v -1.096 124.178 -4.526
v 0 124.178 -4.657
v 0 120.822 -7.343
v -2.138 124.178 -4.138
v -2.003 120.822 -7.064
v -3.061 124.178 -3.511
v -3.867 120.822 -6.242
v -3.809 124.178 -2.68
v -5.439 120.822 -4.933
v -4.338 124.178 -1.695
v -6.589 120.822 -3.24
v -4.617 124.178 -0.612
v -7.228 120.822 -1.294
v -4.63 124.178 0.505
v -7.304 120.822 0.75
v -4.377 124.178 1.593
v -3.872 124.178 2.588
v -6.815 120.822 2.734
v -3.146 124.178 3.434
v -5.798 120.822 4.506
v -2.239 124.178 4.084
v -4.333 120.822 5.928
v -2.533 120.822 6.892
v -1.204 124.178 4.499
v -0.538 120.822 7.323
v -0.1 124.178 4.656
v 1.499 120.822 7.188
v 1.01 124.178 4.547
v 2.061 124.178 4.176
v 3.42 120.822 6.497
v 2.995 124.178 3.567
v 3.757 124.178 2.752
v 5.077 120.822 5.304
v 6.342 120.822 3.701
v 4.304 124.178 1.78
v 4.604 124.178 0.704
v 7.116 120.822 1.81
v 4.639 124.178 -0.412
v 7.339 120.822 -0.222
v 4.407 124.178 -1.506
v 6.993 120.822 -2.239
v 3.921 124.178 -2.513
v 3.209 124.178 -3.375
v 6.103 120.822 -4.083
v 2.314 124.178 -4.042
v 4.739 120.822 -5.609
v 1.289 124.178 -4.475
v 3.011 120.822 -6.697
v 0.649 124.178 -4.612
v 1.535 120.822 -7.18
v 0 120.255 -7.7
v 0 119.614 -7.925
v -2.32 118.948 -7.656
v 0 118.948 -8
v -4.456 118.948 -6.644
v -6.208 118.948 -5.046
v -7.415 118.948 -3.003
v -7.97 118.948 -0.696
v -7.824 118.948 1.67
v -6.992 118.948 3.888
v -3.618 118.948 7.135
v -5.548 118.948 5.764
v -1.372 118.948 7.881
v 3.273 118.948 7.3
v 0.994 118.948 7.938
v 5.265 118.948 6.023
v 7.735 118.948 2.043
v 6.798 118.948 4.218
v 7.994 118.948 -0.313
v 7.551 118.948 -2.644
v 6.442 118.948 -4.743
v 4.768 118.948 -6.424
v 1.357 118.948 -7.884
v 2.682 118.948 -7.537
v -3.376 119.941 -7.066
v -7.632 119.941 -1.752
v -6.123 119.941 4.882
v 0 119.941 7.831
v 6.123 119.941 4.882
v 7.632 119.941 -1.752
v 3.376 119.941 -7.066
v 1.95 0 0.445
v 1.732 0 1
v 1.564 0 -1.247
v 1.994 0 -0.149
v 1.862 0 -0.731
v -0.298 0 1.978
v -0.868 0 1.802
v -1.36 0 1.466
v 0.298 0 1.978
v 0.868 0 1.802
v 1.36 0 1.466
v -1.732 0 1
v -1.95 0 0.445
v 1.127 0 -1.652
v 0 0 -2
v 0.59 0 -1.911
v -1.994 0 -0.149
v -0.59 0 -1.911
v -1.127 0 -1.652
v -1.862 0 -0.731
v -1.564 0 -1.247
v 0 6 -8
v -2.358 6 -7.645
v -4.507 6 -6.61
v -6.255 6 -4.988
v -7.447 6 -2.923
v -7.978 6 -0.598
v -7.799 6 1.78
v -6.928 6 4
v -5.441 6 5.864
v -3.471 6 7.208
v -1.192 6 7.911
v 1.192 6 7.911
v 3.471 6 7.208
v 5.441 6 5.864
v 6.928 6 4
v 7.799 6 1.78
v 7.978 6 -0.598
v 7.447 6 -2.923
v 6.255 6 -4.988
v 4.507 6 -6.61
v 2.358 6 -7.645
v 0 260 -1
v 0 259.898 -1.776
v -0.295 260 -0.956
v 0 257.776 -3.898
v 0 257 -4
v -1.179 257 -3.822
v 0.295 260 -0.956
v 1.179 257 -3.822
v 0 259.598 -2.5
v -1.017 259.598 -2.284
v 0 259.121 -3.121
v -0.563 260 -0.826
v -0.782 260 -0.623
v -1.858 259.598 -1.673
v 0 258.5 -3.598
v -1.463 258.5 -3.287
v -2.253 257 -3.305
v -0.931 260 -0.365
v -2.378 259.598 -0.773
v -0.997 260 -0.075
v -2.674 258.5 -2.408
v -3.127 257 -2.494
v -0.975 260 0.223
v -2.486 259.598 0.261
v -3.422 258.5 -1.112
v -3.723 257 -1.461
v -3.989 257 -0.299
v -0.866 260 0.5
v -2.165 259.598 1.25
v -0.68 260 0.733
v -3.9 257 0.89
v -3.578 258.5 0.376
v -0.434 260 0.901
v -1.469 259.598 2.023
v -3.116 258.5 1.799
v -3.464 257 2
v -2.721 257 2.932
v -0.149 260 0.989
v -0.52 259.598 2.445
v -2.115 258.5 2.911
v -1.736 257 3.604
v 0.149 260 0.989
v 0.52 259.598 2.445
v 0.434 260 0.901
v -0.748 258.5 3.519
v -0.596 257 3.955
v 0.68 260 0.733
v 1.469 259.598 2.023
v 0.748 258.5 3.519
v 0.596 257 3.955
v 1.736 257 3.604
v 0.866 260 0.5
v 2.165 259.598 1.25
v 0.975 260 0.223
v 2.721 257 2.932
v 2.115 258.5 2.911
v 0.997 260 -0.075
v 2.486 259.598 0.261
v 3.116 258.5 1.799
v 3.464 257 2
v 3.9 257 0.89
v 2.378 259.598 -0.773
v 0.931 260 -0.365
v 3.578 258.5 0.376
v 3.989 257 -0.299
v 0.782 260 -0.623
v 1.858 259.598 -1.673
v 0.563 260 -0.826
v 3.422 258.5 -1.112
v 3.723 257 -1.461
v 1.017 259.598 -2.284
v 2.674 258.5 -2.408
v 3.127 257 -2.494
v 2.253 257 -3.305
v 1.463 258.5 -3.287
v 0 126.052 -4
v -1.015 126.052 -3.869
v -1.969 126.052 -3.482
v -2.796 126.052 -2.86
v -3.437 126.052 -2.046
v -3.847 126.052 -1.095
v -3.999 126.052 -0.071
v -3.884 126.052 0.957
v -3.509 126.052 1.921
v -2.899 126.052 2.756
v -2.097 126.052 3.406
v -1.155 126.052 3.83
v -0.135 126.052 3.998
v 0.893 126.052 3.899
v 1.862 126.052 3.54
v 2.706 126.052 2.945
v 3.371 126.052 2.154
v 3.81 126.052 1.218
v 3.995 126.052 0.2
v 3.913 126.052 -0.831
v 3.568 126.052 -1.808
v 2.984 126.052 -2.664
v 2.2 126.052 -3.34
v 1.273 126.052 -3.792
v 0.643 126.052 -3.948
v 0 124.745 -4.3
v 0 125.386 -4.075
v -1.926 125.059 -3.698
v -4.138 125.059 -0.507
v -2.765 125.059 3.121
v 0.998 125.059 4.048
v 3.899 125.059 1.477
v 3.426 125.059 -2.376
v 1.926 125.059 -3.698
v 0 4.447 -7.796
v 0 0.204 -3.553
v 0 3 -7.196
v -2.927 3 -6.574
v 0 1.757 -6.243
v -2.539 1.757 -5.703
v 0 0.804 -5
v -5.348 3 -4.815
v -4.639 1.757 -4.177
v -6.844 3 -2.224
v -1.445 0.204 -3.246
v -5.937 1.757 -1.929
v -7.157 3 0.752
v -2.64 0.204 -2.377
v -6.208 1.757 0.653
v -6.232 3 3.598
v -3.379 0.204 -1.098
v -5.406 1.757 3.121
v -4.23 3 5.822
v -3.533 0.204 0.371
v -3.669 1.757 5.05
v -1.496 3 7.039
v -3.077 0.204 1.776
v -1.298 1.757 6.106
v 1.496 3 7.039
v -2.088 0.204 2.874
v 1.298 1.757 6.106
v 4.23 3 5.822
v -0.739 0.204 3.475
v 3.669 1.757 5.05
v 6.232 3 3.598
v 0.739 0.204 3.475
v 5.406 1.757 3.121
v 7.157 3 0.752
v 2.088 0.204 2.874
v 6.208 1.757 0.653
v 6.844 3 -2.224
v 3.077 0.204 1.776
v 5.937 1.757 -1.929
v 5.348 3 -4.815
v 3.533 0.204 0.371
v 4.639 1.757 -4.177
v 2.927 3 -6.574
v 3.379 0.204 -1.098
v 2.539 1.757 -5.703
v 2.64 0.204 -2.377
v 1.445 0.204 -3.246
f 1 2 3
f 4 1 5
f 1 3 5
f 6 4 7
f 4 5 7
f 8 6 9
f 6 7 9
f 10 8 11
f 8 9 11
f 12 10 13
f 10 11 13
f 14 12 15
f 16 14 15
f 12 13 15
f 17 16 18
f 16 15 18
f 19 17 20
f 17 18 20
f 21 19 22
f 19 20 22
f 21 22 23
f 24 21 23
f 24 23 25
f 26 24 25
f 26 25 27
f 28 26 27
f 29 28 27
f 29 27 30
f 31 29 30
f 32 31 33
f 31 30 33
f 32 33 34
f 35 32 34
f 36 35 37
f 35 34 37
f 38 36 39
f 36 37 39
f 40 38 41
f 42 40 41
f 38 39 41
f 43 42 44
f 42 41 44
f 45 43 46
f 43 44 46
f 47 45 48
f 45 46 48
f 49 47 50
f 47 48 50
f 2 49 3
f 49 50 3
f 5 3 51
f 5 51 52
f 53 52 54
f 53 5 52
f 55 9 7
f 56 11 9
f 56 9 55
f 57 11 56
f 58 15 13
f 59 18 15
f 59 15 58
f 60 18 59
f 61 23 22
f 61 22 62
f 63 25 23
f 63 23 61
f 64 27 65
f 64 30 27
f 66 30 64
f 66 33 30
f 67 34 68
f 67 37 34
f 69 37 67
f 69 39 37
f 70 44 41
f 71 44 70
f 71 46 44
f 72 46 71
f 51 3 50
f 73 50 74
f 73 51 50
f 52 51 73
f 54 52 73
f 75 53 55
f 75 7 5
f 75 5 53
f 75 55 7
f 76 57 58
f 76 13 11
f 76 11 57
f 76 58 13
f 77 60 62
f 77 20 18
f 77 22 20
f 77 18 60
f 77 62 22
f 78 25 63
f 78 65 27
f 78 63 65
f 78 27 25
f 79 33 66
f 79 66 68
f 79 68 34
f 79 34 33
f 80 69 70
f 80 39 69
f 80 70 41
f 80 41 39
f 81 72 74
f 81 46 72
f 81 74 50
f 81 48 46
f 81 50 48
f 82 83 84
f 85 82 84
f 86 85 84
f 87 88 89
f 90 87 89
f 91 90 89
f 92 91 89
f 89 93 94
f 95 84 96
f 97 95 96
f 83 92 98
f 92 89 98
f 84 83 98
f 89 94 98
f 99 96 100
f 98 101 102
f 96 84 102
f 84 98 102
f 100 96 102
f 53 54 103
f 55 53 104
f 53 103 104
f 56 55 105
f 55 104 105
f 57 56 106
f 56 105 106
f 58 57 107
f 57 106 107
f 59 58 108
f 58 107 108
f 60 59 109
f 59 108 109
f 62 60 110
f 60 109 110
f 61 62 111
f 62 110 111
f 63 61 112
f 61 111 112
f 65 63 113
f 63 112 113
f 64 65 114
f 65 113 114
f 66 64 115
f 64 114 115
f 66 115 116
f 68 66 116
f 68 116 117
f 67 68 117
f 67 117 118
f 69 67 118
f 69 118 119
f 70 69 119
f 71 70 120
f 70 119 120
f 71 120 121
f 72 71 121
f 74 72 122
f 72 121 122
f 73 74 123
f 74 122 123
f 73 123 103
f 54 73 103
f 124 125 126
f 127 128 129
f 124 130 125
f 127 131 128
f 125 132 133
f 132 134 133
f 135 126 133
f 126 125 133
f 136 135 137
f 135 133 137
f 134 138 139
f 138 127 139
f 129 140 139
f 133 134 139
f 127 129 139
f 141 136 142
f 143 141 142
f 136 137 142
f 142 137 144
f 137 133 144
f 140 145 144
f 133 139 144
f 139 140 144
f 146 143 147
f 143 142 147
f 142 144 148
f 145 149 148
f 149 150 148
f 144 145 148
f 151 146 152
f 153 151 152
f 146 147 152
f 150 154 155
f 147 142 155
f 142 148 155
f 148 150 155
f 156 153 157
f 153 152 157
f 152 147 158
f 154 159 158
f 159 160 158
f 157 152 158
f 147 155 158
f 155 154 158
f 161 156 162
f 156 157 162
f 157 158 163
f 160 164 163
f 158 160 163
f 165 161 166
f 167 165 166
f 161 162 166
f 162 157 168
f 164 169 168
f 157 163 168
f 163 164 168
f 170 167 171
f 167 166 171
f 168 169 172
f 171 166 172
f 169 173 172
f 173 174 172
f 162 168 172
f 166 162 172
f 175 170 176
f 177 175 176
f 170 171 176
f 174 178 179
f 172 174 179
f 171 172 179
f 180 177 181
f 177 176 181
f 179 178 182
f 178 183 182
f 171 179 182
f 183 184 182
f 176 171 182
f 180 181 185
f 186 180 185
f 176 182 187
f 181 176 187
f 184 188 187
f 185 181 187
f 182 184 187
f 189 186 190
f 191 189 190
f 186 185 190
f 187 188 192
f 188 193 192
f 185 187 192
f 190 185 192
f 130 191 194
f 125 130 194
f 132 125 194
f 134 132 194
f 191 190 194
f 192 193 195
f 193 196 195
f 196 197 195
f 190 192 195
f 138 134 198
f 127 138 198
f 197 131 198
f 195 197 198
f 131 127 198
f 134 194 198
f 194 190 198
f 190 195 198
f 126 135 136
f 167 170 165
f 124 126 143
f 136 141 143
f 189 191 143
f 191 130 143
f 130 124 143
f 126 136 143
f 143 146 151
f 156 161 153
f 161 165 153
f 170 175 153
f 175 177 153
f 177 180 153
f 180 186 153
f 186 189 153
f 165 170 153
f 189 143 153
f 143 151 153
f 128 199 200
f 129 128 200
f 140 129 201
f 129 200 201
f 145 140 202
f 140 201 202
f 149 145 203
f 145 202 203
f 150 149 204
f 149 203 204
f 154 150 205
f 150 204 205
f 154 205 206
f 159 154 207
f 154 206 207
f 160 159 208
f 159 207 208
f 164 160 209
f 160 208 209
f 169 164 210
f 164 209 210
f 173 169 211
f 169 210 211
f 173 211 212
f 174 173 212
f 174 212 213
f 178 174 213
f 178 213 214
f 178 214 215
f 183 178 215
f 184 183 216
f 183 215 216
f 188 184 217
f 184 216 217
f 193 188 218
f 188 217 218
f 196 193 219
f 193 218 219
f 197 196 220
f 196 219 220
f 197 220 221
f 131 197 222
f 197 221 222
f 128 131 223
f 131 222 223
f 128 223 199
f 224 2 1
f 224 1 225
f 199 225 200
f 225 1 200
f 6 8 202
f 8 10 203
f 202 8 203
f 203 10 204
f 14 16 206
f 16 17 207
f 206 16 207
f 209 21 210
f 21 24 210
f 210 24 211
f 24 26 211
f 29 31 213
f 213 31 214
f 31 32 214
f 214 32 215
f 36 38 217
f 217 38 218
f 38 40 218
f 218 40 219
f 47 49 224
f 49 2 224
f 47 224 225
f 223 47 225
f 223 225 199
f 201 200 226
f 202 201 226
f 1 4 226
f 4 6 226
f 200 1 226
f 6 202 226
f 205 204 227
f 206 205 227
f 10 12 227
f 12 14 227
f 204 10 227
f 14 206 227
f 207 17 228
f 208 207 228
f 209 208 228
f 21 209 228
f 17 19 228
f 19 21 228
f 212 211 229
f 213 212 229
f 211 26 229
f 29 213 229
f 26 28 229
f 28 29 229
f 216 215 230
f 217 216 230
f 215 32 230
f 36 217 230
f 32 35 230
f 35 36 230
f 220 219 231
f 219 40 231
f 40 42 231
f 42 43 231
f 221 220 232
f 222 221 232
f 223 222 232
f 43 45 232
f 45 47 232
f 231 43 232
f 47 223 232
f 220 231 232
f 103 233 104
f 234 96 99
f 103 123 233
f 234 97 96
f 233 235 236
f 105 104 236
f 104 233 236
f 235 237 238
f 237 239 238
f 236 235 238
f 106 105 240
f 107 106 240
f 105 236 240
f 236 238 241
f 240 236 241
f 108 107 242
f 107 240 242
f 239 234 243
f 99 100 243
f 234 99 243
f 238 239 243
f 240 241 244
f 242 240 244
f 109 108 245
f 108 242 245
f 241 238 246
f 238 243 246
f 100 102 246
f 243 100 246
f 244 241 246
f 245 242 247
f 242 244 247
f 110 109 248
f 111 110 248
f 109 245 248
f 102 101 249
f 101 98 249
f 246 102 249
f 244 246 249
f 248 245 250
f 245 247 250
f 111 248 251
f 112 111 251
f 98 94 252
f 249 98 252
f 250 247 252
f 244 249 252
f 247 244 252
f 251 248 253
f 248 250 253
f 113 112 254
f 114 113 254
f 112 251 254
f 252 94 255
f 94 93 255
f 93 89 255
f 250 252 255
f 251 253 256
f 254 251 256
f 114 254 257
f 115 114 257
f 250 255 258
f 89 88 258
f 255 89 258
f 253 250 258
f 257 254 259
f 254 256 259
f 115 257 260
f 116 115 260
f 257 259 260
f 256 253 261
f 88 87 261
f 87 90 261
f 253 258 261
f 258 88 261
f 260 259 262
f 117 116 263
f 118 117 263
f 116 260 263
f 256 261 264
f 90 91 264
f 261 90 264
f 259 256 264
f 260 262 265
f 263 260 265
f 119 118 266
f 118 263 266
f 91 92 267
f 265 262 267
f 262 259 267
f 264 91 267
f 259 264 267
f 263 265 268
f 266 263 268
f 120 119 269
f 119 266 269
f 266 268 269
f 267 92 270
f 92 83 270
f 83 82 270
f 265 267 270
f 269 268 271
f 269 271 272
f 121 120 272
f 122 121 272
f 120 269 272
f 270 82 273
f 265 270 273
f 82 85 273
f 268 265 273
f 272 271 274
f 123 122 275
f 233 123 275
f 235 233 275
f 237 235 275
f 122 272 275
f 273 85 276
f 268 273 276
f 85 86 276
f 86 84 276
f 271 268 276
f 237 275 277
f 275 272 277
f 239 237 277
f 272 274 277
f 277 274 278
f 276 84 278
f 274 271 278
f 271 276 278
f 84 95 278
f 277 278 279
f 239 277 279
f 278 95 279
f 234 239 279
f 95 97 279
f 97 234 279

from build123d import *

# Parameters (mm, degrees)
FILLET1_R = 3
FILLET2_R = 3
FILLET3_R = 3
FILLET4_R = 6


with BuildPart() as part:
    # Sketch1 → Revolve1 (revolve)
    with BuildSketch(Plane.XY, mode=Mode.PRIVATE) as revolve1_sk:
        Polygon((0, 0), (0, 260), (-4, 260), (-4, 125), (-8, 120), (-8, 0), align=None)
    revolve(revolve1_sk.sketch.rotate(Axis((0, 0, 0), (0, 1, 0)), 270), axis=Axis((0, 0, 0), (0, 1, 0)))

    # Fillet1
    fillet1_edges = [part.edges().sort_by_distance(p)[0] for p in [
        (0, 260, 4),
    ]]
    fillet(fillet1_edges, radius=FILLET1_R)

    # Fillet2
    fillet2_edges = [part.edges().sort_by_distance(p)[0] for p in [
        (0, 120, 8),
    ]]
    fillet(fillet2_edges, radius=FILLET2_R)

    # Fillet3
    fillet3_edges = [part.edges().sort_by_distance(p)[0] for p in [
        (0, 125, 4),
    ]]
    fillet(fillet3_edges, radius=FILLET3_R)

    # Fillet4
    fillet4_edges = [part.edges().sort_by_distance(p)[0] for p in [
        (0, 0, 8),
    ]]
    fillet(fillet4_edges, radius=FILLET4_R)


solid = part.part
